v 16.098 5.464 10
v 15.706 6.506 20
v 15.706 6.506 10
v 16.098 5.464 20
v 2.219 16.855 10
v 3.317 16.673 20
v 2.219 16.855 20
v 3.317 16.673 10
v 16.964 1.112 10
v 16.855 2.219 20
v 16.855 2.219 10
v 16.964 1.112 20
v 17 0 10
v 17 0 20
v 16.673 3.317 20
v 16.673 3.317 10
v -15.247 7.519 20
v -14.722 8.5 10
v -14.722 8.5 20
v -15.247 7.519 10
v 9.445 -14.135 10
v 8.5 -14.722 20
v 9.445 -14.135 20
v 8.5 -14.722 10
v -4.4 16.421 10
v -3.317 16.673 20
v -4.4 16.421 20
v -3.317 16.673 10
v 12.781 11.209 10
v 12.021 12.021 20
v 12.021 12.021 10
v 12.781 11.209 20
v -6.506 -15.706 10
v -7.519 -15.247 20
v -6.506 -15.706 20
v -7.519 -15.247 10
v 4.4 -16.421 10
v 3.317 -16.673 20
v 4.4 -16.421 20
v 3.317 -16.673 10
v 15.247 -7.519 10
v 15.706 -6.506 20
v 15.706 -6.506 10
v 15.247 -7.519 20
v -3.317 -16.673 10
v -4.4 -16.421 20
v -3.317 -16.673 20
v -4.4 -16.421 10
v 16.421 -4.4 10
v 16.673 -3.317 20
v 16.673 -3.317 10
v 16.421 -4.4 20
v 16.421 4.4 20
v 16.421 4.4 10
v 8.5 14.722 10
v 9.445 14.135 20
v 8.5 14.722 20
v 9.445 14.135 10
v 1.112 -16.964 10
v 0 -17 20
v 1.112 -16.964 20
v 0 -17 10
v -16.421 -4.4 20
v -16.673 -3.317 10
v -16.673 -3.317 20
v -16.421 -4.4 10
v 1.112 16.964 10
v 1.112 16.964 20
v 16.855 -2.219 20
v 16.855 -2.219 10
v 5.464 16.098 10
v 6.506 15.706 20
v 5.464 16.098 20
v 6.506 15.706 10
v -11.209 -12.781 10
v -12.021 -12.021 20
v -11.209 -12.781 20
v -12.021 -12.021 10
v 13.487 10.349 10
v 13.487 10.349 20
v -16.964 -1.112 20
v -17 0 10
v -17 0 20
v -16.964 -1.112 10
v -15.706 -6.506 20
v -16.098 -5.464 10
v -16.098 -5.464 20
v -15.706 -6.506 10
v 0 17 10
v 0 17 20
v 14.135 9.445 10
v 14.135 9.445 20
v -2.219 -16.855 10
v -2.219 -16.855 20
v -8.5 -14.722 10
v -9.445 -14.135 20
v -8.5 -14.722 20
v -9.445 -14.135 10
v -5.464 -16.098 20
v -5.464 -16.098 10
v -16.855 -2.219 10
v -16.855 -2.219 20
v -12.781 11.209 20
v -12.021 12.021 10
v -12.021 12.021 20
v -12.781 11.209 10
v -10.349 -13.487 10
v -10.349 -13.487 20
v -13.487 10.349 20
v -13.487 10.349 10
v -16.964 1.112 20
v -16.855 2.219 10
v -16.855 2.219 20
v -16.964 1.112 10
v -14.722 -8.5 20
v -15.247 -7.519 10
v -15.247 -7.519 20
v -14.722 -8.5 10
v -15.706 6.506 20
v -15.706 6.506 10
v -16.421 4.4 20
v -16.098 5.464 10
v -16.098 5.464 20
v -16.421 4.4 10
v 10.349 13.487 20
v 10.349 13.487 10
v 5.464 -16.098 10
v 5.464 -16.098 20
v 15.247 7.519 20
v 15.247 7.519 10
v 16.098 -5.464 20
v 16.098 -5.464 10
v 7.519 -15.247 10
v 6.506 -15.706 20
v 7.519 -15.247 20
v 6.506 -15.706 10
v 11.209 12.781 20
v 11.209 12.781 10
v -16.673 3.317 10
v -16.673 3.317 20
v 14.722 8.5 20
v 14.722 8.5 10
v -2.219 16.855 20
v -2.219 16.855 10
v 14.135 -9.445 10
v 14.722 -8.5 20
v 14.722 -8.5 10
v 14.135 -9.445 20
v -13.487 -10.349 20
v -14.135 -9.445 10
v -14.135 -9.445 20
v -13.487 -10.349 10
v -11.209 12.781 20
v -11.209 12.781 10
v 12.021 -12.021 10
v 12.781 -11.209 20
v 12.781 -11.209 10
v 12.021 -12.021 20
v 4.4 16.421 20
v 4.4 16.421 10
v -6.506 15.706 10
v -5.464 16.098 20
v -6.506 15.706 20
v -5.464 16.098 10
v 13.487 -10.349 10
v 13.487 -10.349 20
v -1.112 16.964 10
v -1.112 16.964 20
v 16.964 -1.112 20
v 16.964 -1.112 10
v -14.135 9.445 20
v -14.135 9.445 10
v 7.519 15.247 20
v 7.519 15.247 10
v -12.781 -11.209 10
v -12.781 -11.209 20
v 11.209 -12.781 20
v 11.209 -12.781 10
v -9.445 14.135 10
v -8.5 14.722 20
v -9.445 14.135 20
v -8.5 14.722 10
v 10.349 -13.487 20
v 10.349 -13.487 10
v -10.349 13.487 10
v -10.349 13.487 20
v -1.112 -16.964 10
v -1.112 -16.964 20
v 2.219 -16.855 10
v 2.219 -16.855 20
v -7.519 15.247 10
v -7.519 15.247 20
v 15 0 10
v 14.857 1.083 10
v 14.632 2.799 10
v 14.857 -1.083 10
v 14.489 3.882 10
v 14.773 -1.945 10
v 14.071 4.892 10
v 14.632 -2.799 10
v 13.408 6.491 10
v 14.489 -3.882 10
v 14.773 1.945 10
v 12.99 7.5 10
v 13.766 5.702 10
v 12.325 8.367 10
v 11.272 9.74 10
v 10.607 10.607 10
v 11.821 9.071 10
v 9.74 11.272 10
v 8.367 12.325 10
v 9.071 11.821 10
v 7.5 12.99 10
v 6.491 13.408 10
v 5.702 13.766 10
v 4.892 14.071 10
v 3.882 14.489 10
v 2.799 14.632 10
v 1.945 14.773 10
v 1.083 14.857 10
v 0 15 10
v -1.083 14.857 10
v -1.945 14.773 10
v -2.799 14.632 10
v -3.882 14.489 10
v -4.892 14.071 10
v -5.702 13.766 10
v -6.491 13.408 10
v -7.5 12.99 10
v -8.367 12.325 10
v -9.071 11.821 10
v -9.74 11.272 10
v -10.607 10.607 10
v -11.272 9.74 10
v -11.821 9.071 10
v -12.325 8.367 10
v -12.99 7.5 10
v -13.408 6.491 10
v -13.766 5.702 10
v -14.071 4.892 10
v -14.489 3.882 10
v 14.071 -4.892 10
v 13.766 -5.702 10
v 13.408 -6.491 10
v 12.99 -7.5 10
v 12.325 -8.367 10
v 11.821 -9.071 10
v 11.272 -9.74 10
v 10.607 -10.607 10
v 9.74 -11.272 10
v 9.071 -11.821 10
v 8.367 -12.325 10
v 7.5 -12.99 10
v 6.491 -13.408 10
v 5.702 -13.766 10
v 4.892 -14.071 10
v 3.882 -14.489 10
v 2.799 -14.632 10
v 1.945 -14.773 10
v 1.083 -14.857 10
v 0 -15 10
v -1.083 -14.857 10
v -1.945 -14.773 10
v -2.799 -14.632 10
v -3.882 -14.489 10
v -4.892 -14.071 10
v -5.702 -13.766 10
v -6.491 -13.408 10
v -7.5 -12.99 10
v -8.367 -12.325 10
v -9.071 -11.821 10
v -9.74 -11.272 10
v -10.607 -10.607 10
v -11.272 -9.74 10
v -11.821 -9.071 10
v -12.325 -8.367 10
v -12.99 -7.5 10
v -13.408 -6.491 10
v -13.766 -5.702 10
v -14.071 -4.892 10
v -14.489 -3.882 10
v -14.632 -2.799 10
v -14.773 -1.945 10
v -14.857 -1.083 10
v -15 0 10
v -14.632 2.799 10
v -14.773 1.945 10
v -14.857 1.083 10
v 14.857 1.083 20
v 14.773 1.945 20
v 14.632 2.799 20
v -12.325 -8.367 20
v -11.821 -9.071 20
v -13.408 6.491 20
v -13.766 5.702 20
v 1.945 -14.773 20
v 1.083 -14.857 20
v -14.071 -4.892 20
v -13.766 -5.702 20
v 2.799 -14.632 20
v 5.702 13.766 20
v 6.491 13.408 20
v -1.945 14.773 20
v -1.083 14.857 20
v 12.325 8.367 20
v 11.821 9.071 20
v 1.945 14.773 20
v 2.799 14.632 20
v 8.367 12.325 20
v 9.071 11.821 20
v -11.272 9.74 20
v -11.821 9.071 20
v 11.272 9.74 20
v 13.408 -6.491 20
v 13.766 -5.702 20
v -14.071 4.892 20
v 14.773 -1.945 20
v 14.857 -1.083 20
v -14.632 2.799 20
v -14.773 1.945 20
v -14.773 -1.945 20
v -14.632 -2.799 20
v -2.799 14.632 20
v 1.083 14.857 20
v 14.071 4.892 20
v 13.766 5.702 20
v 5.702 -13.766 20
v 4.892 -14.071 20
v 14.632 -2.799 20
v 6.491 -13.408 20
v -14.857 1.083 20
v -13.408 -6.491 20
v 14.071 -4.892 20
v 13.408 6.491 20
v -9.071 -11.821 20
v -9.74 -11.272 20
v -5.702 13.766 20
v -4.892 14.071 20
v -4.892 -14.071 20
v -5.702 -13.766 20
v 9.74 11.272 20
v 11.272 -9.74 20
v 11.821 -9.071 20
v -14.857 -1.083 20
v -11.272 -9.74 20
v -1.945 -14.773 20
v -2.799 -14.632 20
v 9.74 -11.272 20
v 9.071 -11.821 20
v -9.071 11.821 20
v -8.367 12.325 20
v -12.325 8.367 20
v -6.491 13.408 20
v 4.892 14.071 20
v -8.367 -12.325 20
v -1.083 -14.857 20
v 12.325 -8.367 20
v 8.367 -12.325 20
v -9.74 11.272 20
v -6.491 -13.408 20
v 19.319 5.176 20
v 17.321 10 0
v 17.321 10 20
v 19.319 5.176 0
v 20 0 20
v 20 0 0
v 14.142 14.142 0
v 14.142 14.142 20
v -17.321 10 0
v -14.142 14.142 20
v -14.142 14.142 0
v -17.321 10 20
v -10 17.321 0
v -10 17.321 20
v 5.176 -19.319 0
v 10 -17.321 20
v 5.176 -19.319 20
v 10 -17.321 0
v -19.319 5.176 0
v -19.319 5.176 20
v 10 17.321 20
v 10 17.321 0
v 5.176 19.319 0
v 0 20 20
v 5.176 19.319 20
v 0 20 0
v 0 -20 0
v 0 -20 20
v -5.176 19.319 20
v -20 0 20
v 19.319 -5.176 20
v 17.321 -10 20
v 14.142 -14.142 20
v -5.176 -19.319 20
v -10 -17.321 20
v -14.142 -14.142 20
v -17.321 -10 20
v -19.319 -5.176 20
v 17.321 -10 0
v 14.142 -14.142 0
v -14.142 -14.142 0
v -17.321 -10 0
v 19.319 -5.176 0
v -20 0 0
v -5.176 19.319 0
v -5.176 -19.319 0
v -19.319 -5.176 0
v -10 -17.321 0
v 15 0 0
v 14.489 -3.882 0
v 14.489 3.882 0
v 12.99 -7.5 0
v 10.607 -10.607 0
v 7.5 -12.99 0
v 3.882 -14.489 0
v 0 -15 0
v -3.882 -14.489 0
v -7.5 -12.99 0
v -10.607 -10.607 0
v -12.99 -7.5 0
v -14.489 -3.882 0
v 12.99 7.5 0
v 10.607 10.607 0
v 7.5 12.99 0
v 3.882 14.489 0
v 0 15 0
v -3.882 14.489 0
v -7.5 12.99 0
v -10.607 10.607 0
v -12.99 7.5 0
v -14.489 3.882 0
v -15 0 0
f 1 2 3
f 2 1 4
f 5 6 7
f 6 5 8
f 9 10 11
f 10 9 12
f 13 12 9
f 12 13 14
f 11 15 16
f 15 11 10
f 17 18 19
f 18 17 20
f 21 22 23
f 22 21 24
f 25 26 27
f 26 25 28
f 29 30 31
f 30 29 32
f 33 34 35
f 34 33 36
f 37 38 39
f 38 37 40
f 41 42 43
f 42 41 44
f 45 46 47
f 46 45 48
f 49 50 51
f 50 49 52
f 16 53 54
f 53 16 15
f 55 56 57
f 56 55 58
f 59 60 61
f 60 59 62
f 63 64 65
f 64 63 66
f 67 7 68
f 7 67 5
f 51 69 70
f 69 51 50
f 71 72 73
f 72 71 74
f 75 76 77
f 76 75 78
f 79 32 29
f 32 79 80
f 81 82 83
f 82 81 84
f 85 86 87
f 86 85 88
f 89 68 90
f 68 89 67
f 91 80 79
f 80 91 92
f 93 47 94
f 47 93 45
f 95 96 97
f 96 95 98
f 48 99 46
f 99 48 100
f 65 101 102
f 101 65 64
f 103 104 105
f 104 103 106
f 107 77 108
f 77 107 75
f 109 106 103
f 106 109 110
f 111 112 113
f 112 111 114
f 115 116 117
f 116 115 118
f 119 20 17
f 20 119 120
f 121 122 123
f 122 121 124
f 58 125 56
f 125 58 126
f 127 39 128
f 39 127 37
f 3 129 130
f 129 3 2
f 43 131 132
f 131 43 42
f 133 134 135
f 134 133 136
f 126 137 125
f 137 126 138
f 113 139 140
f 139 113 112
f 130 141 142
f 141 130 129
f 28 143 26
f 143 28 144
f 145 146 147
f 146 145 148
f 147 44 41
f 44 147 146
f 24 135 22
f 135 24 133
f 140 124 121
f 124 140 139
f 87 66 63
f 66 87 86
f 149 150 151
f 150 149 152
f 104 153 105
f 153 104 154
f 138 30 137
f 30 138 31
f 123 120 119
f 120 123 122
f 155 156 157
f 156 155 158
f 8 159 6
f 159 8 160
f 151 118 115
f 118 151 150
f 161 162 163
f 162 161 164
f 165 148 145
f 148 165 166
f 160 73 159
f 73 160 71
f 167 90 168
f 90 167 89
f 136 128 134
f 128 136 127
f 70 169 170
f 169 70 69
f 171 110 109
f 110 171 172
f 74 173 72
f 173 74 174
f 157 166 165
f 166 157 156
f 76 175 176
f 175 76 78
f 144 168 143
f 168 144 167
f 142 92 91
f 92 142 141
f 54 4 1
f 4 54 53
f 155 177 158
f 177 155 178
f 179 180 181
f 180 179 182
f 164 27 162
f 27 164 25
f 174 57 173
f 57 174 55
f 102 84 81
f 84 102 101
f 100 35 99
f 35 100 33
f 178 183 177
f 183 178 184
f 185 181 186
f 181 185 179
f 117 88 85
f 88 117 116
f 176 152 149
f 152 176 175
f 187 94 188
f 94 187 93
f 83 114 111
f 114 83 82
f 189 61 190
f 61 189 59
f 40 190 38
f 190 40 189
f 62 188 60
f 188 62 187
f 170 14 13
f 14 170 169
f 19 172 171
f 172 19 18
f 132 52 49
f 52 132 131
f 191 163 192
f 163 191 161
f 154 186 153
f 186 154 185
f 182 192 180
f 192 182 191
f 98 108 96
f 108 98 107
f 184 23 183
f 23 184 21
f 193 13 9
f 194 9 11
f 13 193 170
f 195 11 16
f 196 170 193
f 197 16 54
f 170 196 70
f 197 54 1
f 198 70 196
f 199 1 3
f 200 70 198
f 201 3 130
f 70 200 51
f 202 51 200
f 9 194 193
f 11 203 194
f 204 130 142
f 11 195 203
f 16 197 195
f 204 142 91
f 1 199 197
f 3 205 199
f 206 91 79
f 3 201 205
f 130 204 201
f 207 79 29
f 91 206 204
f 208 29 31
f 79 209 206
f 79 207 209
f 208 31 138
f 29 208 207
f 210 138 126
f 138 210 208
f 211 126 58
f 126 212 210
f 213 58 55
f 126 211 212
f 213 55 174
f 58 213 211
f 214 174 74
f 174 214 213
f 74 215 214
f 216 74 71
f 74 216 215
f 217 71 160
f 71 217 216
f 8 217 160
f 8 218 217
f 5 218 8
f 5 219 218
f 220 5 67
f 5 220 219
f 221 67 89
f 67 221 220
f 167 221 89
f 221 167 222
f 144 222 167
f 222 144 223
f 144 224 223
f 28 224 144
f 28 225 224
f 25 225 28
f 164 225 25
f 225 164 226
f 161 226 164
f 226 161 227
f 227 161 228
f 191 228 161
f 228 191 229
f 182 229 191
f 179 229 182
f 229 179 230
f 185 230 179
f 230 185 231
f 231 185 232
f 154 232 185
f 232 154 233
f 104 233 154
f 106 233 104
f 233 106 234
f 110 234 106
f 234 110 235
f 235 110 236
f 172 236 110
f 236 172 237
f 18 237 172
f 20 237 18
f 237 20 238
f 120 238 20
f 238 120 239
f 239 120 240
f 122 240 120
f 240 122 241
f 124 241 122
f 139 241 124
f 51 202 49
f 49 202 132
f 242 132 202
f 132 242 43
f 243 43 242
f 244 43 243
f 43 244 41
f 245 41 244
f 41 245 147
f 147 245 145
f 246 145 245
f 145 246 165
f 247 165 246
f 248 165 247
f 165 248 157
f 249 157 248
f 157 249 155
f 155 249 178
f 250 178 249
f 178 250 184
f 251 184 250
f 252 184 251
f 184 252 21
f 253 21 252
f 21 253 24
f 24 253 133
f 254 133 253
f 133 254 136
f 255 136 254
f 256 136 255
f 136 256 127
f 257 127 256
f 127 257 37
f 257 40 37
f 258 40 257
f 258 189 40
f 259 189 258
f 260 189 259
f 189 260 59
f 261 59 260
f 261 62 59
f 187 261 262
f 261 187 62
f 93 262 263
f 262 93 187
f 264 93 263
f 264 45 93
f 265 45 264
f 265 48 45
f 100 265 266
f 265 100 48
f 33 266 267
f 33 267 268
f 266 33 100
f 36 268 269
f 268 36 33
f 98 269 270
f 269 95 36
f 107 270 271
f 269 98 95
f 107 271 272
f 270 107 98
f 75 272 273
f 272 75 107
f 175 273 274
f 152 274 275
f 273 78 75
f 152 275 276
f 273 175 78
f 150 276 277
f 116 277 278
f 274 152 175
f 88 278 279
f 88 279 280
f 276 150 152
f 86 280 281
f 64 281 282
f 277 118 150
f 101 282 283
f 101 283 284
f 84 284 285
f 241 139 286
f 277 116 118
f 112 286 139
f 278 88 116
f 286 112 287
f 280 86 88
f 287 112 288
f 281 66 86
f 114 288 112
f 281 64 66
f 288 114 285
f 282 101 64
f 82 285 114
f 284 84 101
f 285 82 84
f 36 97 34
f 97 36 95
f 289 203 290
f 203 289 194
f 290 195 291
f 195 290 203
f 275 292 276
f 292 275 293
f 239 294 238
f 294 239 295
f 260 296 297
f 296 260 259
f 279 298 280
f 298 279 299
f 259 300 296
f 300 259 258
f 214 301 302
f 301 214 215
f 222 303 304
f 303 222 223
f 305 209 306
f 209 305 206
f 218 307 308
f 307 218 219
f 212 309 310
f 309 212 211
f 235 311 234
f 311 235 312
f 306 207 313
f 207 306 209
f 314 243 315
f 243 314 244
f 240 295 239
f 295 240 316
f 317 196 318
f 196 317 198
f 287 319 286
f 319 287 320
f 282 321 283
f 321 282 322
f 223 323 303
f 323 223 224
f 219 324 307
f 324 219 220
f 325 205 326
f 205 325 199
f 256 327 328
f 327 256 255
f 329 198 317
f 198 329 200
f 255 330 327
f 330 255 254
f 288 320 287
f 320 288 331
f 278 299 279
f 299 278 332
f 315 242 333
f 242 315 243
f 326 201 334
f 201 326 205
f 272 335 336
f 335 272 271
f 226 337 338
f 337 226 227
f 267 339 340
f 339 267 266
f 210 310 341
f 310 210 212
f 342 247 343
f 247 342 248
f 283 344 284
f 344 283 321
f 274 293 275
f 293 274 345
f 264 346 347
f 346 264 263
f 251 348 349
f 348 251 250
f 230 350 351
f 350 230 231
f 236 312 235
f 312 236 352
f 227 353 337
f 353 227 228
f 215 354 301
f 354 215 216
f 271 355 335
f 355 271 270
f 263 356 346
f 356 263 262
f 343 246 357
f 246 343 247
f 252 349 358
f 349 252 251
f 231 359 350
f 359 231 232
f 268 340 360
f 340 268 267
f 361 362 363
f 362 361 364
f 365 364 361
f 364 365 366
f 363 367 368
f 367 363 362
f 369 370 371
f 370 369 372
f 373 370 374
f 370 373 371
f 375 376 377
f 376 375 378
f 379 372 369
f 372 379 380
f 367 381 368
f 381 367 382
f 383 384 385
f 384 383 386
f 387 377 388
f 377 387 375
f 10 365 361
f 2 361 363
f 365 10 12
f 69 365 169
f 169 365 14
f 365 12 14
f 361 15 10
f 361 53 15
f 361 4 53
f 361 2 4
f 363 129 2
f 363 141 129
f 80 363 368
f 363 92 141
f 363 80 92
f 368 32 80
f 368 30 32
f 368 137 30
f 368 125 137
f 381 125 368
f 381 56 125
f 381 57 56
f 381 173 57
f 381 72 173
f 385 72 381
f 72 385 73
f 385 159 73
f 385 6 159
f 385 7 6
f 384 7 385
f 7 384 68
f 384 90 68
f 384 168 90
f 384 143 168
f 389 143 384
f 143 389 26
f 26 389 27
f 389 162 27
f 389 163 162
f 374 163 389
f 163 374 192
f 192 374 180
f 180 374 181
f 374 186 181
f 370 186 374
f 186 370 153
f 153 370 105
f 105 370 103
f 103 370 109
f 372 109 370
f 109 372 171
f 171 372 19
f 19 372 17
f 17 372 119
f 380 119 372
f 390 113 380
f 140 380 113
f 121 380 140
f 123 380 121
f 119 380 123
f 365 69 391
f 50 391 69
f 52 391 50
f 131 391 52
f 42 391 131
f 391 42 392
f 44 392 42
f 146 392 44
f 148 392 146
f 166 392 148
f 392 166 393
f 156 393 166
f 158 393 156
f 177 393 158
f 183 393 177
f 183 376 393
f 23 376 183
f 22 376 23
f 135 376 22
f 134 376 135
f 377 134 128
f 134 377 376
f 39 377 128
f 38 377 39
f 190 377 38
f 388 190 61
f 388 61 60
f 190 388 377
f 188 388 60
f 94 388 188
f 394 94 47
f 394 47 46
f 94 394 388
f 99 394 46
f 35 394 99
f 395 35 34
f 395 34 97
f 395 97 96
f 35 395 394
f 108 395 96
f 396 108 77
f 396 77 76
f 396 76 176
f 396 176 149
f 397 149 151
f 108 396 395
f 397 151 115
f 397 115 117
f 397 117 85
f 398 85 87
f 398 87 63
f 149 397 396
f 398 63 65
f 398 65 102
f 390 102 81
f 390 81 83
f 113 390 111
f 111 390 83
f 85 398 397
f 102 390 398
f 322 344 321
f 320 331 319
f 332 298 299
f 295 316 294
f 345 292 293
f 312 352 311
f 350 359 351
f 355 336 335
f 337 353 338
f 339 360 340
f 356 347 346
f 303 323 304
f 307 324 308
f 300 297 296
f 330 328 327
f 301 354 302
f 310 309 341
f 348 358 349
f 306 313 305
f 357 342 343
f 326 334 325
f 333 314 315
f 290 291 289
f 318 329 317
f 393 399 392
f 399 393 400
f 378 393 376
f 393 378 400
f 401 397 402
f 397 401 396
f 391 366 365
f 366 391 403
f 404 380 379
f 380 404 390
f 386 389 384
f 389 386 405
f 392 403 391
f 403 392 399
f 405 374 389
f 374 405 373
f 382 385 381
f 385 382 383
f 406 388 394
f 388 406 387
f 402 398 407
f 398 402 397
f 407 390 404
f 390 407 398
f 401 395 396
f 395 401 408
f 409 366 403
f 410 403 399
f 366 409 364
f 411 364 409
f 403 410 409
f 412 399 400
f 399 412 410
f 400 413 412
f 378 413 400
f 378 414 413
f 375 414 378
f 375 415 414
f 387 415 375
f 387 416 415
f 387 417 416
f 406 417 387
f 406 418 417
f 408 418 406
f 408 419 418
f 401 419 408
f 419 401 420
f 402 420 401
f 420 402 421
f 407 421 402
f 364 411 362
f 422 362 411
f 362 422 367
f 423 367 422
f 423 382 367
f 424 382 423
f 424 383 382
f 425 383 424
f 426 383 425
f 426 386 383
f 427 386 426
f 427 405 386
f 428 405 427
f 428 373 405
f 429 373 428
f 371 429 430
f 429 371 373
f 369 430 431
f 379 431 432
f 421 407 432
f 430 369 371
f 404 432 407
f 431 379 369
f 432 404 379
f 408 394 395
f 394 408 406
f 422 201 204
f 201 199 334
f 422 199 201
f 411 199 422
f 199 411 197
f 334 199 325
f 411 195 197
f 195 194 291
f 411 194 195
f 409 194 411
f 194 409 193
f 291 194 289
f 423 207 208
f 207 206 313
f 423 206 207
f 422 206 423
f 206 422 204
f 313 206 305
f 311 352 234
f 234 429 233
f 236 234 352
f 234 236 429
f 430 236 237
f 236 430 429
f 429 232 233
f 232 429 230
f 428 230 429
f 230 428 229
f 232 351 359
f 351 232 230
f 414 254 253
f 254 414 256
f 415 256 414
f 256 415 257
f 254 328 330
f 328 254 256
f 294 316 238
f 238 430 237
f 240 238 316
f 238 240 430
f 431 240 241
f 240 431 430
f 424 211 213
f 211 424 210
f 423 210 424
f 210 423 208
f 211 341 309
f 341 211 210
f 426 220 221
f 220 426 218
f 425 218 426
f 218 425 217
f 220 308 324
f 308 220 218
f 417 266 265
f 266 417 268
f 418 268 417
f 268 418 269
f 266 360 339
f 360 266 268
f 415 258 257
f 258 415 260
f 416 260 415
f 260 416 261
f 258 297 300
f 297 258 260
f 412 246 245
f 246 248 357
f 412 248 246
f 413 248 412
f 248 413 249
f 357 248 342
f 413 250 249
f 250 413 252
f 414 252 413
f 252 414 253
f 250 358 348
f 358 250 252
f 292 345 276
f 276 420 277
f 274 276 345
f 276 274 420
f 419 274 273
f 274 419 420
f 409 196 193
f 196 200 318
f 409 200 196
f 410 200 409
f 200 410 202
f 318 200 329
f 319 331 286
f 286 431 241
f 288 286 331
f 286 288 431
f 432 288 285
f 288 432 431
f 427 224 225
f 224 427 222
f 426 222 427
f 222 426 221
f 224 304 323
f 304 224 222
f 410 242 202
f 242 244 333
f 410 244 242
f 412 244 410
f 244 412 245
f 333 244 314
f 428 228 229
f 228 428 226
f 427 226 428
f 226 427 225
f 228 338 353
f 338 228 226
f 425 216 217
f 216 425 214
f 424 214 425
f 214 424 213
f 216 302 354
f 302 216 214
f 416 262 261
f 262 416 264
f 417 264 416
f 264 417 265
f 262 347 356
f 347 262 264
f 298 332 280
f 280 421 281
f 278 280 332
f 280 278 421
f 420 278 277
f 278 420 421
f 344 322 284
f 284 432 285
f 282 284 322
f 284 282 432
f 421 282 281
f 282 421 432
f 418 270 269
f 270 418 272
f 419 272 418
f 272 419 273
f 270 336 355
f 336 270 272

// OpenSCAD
// A cutter nearer a surface than that surface's tessellation sags: slivers the
// model does not have survive in the mesh, every face of them made on a
// declared surface. lid10 in eight lines - its bayonet cutters sit `eps` = 0.1
// inside a socket whose chords sag 0.107 - and the case the existence design
// exists for (doc/step-recognition-design.md, "Existence is a D0 question
// too"; checklist B10).
//
// The body is a cylinder r = 20 with a bore r = 15 through it at $fn = 24,
// whose chords sag 15 (1 - cos 7.5 degrees) = 0.128 at their midpoints. From
// z = 10 up, a quarter slot is cut from r = 14.9 out to r = 17 - its inner
// wall at $fn = 96, so it sags only 0.008 and stays near 14.9 all round. The
// model's slot starts inside the bore's air; the mesh's does not everywhere:
// near each chord's midpoint the bore reaches only 14.872 and a sliver between
// it and 14.9 is left standing. Its outer wall is made on the r = 14.9
// cylinder, its inner wall on the bore's, its top on the body's cap - and the
// model has none of them, since everything within r = 15 is the bore's.
//
// The exporter asks the model (recognition/Existence.h): every point of those
// facets, taken onto the surface it was made on, lies inside the bore, so the
// model's solid has no face there. They are phantoms, and while the file writes
// the mesh's slivers rather than the model's solid that is an EXPORT-ERROR,
// named here so the day phantoms are written as the model's solid announces
// itself:
// KNOWN-EXPORT-ERROR: made on a declared surface where the model's solid has no face
//
// And a second, older defect this coupon also carries: the bore's D0 region is
// split between a band's ring and a trimmed patch, on a boundary the model
// does not have (checklist B3) - R0's grant, parked until existence lands:
// KNOWN-EXPORT-ERROR: D0 region is split on a boundary the model does not have
//
// The declarations, read off the model: the body, the bore, the slot's slice
// and its inner cutter are four cylinders; their caps are eight planes, of
// which the bore's top and the slice's top coincide at z = 21.
// EXPECT: 4 analytic surfaces available (4 cylindrical, 0 spherical, 0 toroidal, 0 Bezier), and 7 declared planes
//
// The model's volume is elementary, and not yet asserted - the exact tier
// writes the bore partly as chords, which sit inside it, and the slivers; it
// is the figure the file must reach once both are the model's:
//
//     body   pi * 20^2 * 20                         = 8000 pi
//     bore   pi * 15^2 * 20                         = 4500 pi
//     slot   (90/360) * pi * (17^2 - 15^2) * 10     =  160 pi
//     solid  3340 pi                                = 10492.919463
//
// Measured 2026-09-27: the exact tier exports 10514.507466, the approximation
// tier 10488.521393 with a cylinder face's corner 0.103 off its surface.
//
// **A specimen, not yet a fixture.** Every fixture's approximation tier is
// round-tripped, and a corner off the face it bounds fails that - rightly, and
// no directive may excuse it. This coupon's corner sits where the bore's chord
// meets the phantom sliver: exactly the cut-corner defect the existence design
// is for (steps 4 to 7). It moves to tests/data/scad/step-export/ the day its
// approximation tier survives the round trip, with its VOLUME asserted then;
// until that day the detection it drives is held by
// src/geometry/recognition/existence_test.cc.

difference() {
	cylinder(r = 20, h = 20, $fn = 24);
	translate([0, 0, -1]) cylinder(r = 15, h = 22, $fn = 24);
	translate([0, 0, 10]) difference() {
		cylinder(r = 17, h = 11, angle = 90, $fn = 96);
		translate([0, 0, -1]) cylinder(r = 14.9, h = 13, $fn = 96);
	}
}
